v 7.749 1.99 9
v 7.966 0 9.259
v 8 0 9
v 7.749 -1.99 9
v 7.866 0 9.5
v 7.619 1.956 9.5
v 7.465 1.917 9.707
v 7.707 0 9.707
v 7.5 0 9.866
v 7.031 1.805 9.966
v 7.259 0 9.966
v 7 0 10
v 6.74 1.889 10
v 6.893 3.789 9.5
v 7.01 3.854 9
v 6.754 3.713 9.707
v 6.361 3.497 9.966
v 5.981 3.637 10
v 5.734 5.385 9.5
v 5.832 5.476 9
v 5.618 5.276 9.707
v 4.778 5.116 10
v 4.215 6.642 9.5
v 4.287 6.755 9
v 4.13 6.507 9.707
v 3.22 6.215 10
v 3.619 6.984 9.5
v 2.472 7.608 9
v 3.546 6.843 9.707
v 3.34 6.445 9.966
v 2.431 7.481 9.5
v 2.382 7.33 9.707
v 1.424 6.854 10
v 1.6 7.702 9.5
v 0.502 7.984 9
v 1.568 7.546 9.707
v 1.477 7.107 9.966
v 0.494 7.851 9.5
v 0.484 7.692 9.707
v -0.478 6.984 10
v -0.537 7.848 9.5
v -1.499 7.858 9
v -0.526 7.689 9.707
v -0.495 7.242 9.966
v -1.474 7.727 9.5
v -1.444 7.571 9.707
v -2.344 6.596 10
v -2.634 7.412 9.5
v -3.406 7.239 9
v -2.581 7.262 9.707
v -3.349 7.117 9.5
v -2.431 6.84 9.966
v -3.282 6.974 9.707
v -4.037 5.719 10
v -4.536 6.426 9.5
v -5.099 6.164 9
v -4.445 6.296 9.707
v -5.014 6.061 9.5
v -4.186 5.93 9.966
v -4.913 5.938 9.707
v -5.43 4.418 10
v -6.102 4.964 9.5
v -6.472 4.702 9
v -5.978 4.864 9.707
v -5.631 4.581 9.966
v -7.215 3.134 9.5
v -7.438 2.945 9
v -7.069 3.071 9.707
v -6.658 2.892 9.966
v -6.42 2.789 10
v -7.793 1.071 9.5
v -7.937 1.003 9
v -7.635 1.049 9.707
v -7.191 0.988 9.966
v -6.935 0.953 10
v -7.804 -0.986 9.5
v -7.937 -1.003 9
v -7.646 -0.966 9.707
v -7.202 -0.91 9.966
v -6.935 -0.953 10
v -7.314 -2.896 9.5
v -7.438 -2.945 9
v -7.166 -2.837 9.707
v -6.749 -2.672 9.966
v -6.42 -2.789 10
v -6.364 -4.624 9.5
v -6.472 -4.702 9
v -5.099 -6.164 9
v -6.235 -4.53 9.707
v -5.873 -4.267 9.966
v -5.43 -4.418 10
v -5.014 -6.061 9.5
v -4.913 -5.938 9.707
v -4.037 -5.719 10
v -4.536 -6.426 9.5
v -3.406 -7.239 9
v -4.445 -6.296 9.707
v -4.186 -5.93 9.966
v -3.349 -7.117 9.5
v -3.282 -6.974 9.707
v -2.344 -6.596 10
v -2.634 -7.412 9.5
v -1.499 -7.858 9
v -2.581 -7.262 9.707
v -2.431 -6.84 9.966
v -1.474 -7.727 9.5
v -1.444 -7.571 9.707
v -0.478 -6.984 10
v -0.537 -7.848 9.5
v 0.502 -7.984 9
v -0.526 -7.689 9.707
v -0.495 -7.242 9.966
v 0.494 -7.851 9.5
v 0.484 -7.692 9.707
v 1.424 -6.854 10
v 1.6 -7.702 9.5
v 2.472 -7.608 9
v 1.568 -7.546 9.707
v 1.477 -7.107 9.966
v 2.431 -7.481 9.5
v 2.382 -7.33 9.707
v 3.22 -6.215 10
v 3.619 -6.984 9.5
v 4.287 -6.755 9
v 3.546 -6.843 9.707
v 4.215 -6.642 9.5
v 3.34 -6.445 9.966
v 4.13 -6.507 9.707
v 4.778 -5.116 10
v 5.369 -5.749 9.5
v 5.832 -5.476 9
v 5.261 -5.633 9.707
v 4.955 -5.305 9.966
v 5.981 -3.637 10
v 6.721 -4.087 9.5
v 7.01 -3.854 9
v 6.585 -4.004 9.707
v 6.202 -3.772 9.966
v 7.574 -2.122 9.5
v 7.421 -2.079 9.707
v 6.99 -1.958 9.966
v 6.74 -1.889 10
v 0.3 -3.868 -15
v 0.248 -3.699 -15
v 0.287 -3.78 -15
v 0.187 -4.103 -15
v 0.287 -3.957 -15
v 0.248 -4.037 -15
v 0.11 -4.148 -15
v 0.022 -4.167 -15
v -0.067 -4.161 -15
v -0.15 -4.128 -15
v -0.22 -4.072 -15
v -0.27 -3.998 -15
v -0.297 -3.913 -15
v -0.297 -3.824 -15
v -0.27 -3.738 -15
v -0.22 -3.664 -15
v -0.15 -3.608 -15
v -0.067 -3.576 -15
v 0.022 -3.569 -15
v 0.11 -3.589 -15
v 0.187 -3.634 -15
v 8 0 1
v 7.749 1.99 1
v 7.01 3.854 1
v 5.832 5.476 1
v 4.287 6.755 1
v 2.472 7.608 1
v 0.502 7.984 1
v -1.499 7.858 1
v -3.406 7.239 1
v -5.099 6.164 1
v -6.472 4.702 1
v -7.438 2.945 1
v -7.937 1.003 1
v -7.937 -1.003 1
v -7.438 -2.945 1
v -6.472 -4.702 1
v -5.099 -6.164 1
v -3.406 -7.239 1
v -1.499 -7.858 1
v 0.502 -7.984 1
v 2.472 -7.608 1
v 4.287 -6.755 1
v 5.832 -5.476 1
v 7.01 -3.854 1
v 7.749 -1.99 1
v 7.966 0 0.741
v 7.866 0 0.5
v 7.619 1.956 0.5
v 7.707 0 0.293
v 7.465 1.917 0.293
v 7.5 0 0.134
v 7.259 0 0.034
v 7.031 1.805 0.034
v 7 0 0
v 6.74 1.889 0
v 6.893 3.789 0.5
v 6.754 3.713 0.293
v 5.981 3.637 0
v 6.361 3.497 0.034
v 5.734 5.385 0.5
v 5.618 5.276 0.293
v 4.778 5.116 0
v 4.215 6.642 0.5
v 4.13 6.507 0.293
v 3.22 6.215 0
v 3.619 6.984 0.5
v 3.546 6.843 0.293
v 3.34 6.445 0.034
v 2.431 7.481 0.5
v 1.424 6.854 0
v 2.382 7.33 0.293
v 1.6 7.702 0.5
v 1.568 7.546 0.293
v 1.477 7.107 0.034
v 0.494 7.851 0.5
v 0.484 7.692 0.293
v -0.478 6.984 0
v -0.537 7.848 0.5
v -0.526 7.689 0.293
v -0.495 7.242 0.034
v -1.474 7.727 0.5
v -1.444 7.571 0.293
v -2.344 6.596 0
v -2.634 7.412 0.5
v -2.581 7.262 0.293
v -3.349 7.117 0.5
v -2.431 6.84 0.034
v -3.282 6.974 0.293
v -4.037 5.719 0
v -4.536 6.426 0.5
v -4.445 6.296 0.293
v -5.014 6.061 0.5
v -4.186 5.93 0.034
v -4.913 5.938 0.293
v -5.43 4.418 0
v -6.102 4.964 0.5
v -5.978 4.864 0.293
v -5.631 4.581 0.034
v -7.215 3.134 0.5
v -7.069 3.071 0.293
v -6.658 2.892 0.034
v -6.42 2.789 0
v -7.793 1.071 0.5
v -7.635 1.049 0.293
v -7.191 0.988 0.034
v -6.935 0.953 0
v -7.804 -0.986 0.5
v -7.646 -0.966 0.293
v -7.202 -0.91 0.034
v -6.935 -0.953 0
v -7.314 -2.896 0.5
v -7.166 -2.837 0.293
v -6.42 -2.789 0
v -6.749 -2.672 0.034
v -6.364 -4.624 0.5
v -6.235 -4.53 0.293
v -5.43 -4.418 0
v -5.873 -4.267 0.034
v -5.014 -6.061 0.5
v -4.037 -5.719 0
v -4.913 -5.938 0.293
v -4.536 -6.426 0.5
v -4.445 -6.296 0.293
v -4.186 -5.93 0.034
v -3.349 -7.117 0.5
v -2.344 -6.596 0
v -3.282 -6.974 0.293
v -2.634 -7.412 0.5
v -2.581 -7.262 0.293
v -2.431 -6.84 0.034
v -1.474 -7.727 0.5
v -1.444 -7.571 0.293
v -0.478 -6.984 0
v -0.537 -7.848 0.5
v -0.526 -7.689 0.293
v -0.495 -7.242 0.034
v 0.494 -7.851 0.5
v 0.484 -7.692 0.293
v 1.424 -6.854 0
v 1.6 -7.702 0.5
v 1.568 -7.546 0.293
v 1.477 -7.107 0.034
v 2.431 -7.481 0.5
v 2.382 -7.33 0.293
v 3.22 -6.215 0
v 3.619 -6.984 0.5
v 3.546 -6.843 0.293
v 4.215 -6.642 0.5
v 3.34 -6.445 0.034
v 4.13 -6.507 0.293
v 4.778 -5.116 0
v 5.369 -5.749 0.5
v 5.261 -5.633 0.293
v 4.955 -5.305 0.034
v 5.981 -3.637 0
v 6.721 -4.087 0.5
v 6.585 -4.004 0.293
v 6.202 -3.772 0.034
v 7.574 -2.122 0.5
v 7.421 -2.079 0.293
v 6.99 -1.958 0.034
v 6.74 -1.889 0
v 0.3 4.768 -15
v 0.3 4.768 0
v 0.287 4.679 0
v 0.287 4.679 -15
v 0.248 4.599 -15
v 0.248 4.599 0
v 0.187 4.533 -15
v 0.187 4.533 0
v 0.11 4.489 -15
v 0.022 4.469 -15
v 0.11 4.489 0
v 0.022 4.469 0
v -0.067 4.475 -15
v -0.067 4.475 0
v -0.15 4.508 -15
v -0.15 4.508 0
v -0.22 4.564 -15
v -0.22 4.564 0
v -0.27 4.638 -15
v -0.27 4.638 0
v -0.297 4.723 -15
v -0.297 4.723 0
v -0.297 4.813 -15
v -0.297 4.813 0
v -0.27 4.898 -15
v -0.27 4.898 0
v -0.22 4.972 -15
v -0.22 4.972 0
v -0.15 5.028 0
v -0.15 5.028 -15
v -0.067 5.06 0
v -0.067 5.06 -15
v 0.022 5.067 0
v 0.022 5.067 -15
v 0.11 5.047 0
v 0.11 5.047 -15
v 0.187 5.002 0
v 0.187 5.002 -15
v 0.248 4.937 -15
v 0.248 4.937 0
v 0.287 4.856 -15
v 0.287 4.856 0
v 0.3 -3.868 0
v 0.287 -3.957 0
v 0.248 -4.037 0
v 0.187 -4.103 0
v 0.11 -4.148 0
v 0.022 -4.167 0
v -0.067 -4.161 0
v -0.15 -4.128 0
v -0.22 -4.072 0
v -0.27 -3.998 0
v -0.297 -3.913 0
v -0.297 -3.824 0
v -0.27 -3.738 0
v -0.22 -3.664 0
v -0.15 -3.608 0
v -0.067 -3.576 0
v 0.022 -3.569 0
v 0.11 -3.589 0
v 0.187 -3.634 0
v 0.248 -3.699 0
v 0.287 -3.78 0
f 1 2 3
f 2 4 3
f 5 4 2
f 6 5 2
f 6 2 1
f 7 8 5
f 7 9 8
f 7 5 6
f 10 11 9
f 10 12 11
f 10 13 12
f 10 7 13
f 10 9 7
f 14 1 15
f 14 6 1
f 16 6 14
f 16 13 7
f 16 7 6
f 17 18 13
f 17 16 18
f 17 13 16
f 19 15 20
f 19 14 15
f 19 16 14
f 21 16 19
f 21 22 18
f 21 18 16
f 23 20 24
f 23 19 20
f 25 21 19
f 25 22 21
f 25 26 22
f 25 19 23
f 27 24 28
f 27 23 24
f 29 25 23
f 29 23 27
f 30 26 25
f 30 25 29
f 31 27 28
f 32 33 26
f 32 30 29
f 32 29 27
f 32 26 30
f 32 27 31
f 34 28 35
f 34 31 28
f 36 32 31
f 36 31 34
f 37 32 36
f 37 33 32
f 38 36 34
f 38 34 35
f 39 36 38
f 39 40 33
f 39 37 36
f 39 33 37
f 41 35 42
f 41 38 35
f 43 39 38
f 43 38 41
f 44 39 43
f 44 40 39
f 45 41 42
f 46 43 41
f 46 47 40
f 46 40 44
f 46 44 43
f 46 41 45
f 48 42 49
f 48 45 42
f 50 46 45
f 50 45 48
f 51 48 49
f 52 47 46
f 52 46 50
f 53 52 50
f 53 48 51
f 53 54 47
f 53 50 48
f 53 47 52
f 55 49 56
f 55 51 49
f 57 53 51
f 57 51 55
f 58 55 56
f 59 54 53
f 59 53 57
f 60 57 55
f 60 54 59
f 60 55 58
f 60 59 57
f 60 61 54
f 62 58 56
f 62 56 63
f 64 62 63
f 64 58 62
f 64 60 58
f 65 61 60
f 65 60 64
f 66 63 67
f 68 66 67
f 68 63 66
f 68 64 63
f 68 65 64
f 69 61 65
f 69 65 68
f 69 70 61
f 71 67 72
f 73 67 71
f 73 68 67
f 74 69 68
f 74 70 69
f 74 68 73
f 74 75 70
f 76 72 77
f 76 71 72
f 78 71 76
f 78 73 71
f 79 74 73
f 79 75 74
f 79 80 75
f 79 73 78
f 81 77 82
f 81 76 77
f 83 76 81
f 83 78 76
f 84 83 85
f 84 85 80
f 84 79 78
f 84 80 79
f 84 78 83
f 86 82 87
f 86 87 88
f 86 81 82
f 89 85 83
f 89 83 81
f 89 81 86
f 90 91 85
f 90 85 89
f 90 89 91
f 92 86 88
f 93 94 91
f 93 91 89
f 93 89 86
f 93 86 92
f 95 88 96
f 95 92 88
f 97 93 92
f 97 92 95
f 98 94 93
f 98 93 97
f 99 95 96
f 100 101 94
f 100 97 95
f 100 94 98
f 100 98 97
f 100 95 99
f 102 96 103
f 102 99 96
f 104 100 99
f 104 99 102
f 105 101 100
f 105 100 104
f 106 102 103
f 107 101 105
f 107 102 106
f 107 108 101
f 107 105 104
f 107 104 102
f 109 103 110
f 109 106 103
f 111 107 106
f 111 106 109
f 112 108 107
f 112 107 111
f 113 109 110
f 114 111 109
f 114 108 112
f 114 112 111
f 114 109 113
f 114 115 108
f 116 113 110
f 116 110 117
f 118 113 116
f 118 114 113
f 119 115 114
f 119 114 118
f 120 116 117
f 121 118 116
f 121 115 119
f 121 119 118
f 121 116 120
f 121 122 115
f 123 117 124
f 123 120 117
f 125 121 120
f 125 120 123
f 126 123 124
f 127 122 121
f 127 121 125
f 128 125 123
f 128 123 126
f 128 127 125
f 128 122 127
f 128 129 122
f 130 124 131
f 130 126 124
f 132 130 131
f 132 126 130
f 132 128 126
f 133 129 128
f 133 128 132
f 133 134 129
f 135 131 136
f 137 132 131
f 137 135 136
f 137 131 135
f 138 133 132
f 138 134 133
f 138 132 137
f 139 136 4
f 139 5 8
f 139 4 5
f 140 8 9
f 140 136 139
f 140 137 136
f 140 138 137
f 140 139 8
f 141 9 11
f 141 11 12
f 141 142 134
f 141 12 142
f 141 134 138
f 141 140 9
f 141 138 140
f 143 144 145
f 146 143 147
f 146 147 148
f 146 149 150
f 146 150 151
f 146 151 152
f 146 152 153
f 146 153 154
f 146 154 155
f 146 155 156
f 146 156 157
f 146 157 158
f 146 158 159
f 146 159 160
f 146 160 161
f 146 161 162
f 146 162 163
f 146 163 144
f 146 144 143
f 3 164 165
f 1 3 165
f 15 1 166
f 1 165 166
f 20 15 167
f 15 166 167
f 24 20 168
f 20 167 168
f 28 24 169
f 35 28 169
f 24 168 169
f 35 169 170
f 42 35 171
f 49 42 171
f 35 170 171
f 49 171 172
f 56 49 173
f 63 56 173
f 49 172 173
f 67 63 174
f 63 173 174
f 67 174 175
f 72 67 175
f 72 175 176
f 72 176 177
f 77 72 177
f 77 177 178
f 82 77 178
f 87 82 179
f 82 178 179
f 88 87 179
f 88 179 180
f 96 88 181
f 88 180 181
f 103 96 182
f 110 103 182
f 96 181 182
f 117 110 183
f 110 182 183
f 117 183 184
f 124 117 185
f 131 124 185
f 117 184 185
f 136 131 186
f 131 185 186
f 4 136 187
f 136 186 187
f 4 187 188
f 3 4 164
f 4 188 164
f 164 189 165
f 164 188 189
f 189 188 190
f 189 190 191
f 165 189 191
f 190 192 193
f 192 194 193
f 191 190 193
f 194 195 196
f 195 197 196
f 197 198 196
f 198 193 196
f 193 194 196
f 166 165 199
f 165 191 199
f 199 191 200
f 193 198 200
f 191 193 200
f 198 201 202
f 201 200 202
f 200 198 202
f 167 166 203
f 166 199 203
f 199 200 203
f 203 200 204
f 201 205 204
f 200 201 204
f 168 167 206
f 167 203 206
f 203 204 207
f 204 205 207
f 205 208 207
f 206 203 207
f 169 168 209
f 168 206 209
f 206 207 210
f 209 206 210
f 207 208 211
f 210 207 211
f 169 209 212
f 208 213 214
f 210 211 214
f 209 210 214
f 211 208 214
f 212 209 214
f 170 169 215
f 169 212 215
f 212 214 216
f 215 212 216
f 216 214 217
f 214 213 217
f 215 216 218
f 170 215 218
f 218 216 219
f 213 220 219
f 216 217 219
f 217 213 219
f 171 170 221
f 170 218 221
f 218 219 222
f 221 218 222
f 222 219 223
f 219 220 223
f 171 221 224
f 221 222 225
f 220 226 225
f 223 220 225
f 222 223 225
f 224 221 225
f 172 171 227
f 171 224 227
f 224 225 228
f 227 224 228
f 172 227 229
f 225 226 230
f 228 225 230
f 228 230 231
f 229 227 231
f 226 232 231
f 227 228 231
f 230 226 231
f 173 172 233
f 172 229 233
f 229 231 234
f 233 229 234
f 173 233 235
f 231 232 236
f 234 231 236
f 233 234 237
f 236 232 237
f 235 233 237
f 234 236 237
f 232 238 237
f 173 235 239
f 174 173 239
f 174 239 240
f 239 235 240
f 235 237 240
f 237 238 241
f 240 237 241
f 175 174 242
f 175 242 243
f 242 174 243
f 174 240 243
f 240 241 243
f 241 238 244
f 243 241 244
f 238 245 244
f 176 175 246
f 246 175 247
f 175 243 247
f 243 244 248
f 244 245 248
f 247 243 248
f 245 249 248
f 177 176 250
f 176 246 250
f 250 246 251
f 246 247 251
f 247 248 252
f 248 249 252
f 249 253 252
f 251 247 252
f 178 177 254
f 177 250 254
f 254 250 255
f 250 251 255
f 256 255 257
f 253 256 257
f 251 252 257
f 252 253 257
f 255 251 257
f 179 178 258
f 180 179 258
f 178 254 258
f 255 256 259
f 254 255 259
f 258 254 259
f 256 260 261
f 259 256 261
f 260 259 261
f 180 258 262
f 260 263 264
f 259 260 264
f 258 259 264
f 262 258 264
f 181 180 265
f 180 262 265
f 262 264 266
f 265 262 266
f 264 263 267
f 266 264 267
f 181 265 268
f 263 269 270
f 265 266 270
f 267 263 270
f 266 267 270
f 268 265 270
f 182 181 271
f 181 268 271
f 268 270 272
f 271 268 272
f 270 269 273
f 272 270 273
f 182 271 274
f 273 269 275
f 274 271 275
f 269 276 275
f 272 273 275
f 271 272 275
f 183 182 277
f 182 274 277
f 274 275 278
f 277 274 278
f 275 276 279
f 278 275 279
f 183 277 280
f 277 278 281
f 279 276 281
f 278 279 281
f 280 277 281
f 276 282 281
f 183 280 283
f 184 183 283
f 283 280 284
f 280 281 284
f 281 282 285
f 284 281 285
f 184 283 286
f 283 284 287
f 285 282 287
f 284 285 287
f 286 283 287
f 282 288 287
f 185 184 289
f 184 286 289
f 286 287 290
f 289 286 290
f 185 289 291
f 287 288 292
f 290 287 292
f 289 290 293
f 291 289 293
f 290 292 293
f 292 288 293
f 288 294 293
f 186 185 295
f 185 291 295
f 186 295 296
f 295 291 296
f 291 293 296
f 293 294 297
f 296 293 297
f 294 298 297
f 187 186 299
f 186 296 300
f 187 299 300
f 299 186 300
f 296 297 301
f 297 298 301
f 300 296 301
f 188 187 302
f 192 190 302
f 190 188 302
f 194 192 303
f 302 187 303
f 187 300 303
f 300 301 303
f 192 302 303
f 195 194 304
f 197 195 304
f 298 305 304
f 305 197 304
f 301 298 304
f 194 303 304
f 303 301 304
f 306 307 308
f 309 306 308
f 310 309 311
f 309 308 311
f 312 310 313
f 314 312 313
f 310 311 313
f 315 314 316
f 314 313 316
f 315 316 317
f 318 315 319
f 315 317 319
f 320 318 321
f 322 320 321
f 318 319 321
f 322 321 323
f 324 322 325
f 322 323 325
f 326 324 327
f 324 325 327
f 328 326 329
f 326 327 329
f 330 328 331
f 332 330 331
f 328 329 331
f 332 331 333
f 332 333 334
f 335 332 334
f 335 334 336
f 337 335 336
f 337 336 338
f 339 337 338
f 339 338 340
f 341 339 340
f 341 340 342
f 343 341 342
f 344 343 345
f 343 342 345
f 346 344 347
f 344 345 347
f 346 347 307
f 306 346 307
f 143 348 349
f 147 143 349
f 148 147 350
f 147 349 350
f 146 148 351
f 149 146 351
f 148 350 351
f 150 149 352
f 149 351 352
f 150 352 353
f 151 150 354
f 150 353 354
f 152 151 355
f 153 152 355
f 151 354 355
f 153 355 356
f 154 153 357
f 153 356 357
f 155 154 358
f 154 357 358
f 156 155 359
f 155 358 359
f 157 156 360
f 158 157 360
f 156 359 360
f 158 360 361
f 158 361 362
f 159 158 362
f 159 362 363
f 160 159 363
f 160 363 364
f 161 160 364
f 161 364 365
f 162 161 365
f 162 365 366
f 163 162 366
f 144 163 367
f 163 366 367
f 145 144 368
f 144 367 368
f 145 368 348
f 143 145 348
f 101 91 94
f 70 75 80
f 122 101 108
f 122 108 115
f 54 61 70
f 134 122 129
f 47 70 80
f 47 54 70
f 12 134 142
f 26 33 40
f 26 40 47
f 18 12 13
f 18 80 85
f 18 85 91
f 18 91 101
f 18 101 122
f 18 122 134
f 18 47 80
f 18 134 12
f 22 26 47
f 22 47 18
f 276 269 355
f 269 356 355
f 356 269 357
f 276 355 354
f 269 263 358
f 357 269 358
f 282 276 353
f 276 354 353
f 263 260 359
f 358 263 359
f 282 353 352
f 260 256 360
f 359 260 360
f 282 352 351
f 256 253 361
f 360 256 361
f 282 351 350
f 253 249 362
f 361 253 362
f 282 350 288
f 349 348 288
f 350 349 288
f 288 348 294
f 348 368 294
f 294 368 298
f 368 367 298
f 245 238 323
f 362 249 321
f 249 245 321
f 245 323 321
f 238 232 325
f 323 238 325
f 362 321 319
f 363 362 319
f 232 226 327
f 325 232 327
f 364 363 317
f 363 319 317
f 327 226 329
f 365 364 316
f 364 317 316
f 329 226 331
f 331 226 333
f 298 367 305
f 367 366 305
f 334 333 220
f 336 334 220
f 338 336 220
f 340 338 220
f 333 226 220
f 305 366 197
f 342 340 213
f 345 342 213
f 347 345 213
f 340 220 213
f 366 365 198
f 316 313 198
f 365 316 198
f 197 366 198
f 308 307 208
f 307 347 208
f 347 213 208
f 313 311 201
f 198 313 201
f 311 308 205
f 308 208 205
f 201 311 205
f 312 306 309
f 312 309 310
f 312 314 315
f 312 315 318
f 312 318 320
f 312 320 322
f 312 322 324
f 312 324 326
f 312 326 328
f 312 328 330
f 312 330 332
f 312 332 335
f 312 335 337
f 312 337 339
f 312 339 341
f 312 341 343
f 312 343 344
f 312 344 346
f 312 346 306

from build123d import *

# Parameters (mm, degrees)
F0_R     = 8
F1_DEPTH = 10
F2_R     = 0.3
F3_DEPTH = 15
F4_R     = 1


with BuildPart() as f1:
    # F0 (on Top) → F1 (new body)
    with BuildSketch(Plane.XY):
        Circle(F0_R)
    extrude(amount=F1_DEPTH)

    # F2 (on face) → F3 (join)
    with BuildSketch(Plane(origin=(0, 0, 0), x_dir=(1, 0, 0), z_dir=(0, 0, -1))):
        with Locations((0, 3.868304)):
            Circle(F2_R)
        with Locations((0, -4.767918)):
            Circle(F2_R)
    extrude(amount=F3_DEPTH)

    # F4
    f4_edges = [f1.edges().sort_by_distance(p)[0] for p in [
        (-8, 0, 10),
        (-8, 0, 0),
    ]]
    fillet(f4_edges, radius=F4_R)


solid = f1.part
